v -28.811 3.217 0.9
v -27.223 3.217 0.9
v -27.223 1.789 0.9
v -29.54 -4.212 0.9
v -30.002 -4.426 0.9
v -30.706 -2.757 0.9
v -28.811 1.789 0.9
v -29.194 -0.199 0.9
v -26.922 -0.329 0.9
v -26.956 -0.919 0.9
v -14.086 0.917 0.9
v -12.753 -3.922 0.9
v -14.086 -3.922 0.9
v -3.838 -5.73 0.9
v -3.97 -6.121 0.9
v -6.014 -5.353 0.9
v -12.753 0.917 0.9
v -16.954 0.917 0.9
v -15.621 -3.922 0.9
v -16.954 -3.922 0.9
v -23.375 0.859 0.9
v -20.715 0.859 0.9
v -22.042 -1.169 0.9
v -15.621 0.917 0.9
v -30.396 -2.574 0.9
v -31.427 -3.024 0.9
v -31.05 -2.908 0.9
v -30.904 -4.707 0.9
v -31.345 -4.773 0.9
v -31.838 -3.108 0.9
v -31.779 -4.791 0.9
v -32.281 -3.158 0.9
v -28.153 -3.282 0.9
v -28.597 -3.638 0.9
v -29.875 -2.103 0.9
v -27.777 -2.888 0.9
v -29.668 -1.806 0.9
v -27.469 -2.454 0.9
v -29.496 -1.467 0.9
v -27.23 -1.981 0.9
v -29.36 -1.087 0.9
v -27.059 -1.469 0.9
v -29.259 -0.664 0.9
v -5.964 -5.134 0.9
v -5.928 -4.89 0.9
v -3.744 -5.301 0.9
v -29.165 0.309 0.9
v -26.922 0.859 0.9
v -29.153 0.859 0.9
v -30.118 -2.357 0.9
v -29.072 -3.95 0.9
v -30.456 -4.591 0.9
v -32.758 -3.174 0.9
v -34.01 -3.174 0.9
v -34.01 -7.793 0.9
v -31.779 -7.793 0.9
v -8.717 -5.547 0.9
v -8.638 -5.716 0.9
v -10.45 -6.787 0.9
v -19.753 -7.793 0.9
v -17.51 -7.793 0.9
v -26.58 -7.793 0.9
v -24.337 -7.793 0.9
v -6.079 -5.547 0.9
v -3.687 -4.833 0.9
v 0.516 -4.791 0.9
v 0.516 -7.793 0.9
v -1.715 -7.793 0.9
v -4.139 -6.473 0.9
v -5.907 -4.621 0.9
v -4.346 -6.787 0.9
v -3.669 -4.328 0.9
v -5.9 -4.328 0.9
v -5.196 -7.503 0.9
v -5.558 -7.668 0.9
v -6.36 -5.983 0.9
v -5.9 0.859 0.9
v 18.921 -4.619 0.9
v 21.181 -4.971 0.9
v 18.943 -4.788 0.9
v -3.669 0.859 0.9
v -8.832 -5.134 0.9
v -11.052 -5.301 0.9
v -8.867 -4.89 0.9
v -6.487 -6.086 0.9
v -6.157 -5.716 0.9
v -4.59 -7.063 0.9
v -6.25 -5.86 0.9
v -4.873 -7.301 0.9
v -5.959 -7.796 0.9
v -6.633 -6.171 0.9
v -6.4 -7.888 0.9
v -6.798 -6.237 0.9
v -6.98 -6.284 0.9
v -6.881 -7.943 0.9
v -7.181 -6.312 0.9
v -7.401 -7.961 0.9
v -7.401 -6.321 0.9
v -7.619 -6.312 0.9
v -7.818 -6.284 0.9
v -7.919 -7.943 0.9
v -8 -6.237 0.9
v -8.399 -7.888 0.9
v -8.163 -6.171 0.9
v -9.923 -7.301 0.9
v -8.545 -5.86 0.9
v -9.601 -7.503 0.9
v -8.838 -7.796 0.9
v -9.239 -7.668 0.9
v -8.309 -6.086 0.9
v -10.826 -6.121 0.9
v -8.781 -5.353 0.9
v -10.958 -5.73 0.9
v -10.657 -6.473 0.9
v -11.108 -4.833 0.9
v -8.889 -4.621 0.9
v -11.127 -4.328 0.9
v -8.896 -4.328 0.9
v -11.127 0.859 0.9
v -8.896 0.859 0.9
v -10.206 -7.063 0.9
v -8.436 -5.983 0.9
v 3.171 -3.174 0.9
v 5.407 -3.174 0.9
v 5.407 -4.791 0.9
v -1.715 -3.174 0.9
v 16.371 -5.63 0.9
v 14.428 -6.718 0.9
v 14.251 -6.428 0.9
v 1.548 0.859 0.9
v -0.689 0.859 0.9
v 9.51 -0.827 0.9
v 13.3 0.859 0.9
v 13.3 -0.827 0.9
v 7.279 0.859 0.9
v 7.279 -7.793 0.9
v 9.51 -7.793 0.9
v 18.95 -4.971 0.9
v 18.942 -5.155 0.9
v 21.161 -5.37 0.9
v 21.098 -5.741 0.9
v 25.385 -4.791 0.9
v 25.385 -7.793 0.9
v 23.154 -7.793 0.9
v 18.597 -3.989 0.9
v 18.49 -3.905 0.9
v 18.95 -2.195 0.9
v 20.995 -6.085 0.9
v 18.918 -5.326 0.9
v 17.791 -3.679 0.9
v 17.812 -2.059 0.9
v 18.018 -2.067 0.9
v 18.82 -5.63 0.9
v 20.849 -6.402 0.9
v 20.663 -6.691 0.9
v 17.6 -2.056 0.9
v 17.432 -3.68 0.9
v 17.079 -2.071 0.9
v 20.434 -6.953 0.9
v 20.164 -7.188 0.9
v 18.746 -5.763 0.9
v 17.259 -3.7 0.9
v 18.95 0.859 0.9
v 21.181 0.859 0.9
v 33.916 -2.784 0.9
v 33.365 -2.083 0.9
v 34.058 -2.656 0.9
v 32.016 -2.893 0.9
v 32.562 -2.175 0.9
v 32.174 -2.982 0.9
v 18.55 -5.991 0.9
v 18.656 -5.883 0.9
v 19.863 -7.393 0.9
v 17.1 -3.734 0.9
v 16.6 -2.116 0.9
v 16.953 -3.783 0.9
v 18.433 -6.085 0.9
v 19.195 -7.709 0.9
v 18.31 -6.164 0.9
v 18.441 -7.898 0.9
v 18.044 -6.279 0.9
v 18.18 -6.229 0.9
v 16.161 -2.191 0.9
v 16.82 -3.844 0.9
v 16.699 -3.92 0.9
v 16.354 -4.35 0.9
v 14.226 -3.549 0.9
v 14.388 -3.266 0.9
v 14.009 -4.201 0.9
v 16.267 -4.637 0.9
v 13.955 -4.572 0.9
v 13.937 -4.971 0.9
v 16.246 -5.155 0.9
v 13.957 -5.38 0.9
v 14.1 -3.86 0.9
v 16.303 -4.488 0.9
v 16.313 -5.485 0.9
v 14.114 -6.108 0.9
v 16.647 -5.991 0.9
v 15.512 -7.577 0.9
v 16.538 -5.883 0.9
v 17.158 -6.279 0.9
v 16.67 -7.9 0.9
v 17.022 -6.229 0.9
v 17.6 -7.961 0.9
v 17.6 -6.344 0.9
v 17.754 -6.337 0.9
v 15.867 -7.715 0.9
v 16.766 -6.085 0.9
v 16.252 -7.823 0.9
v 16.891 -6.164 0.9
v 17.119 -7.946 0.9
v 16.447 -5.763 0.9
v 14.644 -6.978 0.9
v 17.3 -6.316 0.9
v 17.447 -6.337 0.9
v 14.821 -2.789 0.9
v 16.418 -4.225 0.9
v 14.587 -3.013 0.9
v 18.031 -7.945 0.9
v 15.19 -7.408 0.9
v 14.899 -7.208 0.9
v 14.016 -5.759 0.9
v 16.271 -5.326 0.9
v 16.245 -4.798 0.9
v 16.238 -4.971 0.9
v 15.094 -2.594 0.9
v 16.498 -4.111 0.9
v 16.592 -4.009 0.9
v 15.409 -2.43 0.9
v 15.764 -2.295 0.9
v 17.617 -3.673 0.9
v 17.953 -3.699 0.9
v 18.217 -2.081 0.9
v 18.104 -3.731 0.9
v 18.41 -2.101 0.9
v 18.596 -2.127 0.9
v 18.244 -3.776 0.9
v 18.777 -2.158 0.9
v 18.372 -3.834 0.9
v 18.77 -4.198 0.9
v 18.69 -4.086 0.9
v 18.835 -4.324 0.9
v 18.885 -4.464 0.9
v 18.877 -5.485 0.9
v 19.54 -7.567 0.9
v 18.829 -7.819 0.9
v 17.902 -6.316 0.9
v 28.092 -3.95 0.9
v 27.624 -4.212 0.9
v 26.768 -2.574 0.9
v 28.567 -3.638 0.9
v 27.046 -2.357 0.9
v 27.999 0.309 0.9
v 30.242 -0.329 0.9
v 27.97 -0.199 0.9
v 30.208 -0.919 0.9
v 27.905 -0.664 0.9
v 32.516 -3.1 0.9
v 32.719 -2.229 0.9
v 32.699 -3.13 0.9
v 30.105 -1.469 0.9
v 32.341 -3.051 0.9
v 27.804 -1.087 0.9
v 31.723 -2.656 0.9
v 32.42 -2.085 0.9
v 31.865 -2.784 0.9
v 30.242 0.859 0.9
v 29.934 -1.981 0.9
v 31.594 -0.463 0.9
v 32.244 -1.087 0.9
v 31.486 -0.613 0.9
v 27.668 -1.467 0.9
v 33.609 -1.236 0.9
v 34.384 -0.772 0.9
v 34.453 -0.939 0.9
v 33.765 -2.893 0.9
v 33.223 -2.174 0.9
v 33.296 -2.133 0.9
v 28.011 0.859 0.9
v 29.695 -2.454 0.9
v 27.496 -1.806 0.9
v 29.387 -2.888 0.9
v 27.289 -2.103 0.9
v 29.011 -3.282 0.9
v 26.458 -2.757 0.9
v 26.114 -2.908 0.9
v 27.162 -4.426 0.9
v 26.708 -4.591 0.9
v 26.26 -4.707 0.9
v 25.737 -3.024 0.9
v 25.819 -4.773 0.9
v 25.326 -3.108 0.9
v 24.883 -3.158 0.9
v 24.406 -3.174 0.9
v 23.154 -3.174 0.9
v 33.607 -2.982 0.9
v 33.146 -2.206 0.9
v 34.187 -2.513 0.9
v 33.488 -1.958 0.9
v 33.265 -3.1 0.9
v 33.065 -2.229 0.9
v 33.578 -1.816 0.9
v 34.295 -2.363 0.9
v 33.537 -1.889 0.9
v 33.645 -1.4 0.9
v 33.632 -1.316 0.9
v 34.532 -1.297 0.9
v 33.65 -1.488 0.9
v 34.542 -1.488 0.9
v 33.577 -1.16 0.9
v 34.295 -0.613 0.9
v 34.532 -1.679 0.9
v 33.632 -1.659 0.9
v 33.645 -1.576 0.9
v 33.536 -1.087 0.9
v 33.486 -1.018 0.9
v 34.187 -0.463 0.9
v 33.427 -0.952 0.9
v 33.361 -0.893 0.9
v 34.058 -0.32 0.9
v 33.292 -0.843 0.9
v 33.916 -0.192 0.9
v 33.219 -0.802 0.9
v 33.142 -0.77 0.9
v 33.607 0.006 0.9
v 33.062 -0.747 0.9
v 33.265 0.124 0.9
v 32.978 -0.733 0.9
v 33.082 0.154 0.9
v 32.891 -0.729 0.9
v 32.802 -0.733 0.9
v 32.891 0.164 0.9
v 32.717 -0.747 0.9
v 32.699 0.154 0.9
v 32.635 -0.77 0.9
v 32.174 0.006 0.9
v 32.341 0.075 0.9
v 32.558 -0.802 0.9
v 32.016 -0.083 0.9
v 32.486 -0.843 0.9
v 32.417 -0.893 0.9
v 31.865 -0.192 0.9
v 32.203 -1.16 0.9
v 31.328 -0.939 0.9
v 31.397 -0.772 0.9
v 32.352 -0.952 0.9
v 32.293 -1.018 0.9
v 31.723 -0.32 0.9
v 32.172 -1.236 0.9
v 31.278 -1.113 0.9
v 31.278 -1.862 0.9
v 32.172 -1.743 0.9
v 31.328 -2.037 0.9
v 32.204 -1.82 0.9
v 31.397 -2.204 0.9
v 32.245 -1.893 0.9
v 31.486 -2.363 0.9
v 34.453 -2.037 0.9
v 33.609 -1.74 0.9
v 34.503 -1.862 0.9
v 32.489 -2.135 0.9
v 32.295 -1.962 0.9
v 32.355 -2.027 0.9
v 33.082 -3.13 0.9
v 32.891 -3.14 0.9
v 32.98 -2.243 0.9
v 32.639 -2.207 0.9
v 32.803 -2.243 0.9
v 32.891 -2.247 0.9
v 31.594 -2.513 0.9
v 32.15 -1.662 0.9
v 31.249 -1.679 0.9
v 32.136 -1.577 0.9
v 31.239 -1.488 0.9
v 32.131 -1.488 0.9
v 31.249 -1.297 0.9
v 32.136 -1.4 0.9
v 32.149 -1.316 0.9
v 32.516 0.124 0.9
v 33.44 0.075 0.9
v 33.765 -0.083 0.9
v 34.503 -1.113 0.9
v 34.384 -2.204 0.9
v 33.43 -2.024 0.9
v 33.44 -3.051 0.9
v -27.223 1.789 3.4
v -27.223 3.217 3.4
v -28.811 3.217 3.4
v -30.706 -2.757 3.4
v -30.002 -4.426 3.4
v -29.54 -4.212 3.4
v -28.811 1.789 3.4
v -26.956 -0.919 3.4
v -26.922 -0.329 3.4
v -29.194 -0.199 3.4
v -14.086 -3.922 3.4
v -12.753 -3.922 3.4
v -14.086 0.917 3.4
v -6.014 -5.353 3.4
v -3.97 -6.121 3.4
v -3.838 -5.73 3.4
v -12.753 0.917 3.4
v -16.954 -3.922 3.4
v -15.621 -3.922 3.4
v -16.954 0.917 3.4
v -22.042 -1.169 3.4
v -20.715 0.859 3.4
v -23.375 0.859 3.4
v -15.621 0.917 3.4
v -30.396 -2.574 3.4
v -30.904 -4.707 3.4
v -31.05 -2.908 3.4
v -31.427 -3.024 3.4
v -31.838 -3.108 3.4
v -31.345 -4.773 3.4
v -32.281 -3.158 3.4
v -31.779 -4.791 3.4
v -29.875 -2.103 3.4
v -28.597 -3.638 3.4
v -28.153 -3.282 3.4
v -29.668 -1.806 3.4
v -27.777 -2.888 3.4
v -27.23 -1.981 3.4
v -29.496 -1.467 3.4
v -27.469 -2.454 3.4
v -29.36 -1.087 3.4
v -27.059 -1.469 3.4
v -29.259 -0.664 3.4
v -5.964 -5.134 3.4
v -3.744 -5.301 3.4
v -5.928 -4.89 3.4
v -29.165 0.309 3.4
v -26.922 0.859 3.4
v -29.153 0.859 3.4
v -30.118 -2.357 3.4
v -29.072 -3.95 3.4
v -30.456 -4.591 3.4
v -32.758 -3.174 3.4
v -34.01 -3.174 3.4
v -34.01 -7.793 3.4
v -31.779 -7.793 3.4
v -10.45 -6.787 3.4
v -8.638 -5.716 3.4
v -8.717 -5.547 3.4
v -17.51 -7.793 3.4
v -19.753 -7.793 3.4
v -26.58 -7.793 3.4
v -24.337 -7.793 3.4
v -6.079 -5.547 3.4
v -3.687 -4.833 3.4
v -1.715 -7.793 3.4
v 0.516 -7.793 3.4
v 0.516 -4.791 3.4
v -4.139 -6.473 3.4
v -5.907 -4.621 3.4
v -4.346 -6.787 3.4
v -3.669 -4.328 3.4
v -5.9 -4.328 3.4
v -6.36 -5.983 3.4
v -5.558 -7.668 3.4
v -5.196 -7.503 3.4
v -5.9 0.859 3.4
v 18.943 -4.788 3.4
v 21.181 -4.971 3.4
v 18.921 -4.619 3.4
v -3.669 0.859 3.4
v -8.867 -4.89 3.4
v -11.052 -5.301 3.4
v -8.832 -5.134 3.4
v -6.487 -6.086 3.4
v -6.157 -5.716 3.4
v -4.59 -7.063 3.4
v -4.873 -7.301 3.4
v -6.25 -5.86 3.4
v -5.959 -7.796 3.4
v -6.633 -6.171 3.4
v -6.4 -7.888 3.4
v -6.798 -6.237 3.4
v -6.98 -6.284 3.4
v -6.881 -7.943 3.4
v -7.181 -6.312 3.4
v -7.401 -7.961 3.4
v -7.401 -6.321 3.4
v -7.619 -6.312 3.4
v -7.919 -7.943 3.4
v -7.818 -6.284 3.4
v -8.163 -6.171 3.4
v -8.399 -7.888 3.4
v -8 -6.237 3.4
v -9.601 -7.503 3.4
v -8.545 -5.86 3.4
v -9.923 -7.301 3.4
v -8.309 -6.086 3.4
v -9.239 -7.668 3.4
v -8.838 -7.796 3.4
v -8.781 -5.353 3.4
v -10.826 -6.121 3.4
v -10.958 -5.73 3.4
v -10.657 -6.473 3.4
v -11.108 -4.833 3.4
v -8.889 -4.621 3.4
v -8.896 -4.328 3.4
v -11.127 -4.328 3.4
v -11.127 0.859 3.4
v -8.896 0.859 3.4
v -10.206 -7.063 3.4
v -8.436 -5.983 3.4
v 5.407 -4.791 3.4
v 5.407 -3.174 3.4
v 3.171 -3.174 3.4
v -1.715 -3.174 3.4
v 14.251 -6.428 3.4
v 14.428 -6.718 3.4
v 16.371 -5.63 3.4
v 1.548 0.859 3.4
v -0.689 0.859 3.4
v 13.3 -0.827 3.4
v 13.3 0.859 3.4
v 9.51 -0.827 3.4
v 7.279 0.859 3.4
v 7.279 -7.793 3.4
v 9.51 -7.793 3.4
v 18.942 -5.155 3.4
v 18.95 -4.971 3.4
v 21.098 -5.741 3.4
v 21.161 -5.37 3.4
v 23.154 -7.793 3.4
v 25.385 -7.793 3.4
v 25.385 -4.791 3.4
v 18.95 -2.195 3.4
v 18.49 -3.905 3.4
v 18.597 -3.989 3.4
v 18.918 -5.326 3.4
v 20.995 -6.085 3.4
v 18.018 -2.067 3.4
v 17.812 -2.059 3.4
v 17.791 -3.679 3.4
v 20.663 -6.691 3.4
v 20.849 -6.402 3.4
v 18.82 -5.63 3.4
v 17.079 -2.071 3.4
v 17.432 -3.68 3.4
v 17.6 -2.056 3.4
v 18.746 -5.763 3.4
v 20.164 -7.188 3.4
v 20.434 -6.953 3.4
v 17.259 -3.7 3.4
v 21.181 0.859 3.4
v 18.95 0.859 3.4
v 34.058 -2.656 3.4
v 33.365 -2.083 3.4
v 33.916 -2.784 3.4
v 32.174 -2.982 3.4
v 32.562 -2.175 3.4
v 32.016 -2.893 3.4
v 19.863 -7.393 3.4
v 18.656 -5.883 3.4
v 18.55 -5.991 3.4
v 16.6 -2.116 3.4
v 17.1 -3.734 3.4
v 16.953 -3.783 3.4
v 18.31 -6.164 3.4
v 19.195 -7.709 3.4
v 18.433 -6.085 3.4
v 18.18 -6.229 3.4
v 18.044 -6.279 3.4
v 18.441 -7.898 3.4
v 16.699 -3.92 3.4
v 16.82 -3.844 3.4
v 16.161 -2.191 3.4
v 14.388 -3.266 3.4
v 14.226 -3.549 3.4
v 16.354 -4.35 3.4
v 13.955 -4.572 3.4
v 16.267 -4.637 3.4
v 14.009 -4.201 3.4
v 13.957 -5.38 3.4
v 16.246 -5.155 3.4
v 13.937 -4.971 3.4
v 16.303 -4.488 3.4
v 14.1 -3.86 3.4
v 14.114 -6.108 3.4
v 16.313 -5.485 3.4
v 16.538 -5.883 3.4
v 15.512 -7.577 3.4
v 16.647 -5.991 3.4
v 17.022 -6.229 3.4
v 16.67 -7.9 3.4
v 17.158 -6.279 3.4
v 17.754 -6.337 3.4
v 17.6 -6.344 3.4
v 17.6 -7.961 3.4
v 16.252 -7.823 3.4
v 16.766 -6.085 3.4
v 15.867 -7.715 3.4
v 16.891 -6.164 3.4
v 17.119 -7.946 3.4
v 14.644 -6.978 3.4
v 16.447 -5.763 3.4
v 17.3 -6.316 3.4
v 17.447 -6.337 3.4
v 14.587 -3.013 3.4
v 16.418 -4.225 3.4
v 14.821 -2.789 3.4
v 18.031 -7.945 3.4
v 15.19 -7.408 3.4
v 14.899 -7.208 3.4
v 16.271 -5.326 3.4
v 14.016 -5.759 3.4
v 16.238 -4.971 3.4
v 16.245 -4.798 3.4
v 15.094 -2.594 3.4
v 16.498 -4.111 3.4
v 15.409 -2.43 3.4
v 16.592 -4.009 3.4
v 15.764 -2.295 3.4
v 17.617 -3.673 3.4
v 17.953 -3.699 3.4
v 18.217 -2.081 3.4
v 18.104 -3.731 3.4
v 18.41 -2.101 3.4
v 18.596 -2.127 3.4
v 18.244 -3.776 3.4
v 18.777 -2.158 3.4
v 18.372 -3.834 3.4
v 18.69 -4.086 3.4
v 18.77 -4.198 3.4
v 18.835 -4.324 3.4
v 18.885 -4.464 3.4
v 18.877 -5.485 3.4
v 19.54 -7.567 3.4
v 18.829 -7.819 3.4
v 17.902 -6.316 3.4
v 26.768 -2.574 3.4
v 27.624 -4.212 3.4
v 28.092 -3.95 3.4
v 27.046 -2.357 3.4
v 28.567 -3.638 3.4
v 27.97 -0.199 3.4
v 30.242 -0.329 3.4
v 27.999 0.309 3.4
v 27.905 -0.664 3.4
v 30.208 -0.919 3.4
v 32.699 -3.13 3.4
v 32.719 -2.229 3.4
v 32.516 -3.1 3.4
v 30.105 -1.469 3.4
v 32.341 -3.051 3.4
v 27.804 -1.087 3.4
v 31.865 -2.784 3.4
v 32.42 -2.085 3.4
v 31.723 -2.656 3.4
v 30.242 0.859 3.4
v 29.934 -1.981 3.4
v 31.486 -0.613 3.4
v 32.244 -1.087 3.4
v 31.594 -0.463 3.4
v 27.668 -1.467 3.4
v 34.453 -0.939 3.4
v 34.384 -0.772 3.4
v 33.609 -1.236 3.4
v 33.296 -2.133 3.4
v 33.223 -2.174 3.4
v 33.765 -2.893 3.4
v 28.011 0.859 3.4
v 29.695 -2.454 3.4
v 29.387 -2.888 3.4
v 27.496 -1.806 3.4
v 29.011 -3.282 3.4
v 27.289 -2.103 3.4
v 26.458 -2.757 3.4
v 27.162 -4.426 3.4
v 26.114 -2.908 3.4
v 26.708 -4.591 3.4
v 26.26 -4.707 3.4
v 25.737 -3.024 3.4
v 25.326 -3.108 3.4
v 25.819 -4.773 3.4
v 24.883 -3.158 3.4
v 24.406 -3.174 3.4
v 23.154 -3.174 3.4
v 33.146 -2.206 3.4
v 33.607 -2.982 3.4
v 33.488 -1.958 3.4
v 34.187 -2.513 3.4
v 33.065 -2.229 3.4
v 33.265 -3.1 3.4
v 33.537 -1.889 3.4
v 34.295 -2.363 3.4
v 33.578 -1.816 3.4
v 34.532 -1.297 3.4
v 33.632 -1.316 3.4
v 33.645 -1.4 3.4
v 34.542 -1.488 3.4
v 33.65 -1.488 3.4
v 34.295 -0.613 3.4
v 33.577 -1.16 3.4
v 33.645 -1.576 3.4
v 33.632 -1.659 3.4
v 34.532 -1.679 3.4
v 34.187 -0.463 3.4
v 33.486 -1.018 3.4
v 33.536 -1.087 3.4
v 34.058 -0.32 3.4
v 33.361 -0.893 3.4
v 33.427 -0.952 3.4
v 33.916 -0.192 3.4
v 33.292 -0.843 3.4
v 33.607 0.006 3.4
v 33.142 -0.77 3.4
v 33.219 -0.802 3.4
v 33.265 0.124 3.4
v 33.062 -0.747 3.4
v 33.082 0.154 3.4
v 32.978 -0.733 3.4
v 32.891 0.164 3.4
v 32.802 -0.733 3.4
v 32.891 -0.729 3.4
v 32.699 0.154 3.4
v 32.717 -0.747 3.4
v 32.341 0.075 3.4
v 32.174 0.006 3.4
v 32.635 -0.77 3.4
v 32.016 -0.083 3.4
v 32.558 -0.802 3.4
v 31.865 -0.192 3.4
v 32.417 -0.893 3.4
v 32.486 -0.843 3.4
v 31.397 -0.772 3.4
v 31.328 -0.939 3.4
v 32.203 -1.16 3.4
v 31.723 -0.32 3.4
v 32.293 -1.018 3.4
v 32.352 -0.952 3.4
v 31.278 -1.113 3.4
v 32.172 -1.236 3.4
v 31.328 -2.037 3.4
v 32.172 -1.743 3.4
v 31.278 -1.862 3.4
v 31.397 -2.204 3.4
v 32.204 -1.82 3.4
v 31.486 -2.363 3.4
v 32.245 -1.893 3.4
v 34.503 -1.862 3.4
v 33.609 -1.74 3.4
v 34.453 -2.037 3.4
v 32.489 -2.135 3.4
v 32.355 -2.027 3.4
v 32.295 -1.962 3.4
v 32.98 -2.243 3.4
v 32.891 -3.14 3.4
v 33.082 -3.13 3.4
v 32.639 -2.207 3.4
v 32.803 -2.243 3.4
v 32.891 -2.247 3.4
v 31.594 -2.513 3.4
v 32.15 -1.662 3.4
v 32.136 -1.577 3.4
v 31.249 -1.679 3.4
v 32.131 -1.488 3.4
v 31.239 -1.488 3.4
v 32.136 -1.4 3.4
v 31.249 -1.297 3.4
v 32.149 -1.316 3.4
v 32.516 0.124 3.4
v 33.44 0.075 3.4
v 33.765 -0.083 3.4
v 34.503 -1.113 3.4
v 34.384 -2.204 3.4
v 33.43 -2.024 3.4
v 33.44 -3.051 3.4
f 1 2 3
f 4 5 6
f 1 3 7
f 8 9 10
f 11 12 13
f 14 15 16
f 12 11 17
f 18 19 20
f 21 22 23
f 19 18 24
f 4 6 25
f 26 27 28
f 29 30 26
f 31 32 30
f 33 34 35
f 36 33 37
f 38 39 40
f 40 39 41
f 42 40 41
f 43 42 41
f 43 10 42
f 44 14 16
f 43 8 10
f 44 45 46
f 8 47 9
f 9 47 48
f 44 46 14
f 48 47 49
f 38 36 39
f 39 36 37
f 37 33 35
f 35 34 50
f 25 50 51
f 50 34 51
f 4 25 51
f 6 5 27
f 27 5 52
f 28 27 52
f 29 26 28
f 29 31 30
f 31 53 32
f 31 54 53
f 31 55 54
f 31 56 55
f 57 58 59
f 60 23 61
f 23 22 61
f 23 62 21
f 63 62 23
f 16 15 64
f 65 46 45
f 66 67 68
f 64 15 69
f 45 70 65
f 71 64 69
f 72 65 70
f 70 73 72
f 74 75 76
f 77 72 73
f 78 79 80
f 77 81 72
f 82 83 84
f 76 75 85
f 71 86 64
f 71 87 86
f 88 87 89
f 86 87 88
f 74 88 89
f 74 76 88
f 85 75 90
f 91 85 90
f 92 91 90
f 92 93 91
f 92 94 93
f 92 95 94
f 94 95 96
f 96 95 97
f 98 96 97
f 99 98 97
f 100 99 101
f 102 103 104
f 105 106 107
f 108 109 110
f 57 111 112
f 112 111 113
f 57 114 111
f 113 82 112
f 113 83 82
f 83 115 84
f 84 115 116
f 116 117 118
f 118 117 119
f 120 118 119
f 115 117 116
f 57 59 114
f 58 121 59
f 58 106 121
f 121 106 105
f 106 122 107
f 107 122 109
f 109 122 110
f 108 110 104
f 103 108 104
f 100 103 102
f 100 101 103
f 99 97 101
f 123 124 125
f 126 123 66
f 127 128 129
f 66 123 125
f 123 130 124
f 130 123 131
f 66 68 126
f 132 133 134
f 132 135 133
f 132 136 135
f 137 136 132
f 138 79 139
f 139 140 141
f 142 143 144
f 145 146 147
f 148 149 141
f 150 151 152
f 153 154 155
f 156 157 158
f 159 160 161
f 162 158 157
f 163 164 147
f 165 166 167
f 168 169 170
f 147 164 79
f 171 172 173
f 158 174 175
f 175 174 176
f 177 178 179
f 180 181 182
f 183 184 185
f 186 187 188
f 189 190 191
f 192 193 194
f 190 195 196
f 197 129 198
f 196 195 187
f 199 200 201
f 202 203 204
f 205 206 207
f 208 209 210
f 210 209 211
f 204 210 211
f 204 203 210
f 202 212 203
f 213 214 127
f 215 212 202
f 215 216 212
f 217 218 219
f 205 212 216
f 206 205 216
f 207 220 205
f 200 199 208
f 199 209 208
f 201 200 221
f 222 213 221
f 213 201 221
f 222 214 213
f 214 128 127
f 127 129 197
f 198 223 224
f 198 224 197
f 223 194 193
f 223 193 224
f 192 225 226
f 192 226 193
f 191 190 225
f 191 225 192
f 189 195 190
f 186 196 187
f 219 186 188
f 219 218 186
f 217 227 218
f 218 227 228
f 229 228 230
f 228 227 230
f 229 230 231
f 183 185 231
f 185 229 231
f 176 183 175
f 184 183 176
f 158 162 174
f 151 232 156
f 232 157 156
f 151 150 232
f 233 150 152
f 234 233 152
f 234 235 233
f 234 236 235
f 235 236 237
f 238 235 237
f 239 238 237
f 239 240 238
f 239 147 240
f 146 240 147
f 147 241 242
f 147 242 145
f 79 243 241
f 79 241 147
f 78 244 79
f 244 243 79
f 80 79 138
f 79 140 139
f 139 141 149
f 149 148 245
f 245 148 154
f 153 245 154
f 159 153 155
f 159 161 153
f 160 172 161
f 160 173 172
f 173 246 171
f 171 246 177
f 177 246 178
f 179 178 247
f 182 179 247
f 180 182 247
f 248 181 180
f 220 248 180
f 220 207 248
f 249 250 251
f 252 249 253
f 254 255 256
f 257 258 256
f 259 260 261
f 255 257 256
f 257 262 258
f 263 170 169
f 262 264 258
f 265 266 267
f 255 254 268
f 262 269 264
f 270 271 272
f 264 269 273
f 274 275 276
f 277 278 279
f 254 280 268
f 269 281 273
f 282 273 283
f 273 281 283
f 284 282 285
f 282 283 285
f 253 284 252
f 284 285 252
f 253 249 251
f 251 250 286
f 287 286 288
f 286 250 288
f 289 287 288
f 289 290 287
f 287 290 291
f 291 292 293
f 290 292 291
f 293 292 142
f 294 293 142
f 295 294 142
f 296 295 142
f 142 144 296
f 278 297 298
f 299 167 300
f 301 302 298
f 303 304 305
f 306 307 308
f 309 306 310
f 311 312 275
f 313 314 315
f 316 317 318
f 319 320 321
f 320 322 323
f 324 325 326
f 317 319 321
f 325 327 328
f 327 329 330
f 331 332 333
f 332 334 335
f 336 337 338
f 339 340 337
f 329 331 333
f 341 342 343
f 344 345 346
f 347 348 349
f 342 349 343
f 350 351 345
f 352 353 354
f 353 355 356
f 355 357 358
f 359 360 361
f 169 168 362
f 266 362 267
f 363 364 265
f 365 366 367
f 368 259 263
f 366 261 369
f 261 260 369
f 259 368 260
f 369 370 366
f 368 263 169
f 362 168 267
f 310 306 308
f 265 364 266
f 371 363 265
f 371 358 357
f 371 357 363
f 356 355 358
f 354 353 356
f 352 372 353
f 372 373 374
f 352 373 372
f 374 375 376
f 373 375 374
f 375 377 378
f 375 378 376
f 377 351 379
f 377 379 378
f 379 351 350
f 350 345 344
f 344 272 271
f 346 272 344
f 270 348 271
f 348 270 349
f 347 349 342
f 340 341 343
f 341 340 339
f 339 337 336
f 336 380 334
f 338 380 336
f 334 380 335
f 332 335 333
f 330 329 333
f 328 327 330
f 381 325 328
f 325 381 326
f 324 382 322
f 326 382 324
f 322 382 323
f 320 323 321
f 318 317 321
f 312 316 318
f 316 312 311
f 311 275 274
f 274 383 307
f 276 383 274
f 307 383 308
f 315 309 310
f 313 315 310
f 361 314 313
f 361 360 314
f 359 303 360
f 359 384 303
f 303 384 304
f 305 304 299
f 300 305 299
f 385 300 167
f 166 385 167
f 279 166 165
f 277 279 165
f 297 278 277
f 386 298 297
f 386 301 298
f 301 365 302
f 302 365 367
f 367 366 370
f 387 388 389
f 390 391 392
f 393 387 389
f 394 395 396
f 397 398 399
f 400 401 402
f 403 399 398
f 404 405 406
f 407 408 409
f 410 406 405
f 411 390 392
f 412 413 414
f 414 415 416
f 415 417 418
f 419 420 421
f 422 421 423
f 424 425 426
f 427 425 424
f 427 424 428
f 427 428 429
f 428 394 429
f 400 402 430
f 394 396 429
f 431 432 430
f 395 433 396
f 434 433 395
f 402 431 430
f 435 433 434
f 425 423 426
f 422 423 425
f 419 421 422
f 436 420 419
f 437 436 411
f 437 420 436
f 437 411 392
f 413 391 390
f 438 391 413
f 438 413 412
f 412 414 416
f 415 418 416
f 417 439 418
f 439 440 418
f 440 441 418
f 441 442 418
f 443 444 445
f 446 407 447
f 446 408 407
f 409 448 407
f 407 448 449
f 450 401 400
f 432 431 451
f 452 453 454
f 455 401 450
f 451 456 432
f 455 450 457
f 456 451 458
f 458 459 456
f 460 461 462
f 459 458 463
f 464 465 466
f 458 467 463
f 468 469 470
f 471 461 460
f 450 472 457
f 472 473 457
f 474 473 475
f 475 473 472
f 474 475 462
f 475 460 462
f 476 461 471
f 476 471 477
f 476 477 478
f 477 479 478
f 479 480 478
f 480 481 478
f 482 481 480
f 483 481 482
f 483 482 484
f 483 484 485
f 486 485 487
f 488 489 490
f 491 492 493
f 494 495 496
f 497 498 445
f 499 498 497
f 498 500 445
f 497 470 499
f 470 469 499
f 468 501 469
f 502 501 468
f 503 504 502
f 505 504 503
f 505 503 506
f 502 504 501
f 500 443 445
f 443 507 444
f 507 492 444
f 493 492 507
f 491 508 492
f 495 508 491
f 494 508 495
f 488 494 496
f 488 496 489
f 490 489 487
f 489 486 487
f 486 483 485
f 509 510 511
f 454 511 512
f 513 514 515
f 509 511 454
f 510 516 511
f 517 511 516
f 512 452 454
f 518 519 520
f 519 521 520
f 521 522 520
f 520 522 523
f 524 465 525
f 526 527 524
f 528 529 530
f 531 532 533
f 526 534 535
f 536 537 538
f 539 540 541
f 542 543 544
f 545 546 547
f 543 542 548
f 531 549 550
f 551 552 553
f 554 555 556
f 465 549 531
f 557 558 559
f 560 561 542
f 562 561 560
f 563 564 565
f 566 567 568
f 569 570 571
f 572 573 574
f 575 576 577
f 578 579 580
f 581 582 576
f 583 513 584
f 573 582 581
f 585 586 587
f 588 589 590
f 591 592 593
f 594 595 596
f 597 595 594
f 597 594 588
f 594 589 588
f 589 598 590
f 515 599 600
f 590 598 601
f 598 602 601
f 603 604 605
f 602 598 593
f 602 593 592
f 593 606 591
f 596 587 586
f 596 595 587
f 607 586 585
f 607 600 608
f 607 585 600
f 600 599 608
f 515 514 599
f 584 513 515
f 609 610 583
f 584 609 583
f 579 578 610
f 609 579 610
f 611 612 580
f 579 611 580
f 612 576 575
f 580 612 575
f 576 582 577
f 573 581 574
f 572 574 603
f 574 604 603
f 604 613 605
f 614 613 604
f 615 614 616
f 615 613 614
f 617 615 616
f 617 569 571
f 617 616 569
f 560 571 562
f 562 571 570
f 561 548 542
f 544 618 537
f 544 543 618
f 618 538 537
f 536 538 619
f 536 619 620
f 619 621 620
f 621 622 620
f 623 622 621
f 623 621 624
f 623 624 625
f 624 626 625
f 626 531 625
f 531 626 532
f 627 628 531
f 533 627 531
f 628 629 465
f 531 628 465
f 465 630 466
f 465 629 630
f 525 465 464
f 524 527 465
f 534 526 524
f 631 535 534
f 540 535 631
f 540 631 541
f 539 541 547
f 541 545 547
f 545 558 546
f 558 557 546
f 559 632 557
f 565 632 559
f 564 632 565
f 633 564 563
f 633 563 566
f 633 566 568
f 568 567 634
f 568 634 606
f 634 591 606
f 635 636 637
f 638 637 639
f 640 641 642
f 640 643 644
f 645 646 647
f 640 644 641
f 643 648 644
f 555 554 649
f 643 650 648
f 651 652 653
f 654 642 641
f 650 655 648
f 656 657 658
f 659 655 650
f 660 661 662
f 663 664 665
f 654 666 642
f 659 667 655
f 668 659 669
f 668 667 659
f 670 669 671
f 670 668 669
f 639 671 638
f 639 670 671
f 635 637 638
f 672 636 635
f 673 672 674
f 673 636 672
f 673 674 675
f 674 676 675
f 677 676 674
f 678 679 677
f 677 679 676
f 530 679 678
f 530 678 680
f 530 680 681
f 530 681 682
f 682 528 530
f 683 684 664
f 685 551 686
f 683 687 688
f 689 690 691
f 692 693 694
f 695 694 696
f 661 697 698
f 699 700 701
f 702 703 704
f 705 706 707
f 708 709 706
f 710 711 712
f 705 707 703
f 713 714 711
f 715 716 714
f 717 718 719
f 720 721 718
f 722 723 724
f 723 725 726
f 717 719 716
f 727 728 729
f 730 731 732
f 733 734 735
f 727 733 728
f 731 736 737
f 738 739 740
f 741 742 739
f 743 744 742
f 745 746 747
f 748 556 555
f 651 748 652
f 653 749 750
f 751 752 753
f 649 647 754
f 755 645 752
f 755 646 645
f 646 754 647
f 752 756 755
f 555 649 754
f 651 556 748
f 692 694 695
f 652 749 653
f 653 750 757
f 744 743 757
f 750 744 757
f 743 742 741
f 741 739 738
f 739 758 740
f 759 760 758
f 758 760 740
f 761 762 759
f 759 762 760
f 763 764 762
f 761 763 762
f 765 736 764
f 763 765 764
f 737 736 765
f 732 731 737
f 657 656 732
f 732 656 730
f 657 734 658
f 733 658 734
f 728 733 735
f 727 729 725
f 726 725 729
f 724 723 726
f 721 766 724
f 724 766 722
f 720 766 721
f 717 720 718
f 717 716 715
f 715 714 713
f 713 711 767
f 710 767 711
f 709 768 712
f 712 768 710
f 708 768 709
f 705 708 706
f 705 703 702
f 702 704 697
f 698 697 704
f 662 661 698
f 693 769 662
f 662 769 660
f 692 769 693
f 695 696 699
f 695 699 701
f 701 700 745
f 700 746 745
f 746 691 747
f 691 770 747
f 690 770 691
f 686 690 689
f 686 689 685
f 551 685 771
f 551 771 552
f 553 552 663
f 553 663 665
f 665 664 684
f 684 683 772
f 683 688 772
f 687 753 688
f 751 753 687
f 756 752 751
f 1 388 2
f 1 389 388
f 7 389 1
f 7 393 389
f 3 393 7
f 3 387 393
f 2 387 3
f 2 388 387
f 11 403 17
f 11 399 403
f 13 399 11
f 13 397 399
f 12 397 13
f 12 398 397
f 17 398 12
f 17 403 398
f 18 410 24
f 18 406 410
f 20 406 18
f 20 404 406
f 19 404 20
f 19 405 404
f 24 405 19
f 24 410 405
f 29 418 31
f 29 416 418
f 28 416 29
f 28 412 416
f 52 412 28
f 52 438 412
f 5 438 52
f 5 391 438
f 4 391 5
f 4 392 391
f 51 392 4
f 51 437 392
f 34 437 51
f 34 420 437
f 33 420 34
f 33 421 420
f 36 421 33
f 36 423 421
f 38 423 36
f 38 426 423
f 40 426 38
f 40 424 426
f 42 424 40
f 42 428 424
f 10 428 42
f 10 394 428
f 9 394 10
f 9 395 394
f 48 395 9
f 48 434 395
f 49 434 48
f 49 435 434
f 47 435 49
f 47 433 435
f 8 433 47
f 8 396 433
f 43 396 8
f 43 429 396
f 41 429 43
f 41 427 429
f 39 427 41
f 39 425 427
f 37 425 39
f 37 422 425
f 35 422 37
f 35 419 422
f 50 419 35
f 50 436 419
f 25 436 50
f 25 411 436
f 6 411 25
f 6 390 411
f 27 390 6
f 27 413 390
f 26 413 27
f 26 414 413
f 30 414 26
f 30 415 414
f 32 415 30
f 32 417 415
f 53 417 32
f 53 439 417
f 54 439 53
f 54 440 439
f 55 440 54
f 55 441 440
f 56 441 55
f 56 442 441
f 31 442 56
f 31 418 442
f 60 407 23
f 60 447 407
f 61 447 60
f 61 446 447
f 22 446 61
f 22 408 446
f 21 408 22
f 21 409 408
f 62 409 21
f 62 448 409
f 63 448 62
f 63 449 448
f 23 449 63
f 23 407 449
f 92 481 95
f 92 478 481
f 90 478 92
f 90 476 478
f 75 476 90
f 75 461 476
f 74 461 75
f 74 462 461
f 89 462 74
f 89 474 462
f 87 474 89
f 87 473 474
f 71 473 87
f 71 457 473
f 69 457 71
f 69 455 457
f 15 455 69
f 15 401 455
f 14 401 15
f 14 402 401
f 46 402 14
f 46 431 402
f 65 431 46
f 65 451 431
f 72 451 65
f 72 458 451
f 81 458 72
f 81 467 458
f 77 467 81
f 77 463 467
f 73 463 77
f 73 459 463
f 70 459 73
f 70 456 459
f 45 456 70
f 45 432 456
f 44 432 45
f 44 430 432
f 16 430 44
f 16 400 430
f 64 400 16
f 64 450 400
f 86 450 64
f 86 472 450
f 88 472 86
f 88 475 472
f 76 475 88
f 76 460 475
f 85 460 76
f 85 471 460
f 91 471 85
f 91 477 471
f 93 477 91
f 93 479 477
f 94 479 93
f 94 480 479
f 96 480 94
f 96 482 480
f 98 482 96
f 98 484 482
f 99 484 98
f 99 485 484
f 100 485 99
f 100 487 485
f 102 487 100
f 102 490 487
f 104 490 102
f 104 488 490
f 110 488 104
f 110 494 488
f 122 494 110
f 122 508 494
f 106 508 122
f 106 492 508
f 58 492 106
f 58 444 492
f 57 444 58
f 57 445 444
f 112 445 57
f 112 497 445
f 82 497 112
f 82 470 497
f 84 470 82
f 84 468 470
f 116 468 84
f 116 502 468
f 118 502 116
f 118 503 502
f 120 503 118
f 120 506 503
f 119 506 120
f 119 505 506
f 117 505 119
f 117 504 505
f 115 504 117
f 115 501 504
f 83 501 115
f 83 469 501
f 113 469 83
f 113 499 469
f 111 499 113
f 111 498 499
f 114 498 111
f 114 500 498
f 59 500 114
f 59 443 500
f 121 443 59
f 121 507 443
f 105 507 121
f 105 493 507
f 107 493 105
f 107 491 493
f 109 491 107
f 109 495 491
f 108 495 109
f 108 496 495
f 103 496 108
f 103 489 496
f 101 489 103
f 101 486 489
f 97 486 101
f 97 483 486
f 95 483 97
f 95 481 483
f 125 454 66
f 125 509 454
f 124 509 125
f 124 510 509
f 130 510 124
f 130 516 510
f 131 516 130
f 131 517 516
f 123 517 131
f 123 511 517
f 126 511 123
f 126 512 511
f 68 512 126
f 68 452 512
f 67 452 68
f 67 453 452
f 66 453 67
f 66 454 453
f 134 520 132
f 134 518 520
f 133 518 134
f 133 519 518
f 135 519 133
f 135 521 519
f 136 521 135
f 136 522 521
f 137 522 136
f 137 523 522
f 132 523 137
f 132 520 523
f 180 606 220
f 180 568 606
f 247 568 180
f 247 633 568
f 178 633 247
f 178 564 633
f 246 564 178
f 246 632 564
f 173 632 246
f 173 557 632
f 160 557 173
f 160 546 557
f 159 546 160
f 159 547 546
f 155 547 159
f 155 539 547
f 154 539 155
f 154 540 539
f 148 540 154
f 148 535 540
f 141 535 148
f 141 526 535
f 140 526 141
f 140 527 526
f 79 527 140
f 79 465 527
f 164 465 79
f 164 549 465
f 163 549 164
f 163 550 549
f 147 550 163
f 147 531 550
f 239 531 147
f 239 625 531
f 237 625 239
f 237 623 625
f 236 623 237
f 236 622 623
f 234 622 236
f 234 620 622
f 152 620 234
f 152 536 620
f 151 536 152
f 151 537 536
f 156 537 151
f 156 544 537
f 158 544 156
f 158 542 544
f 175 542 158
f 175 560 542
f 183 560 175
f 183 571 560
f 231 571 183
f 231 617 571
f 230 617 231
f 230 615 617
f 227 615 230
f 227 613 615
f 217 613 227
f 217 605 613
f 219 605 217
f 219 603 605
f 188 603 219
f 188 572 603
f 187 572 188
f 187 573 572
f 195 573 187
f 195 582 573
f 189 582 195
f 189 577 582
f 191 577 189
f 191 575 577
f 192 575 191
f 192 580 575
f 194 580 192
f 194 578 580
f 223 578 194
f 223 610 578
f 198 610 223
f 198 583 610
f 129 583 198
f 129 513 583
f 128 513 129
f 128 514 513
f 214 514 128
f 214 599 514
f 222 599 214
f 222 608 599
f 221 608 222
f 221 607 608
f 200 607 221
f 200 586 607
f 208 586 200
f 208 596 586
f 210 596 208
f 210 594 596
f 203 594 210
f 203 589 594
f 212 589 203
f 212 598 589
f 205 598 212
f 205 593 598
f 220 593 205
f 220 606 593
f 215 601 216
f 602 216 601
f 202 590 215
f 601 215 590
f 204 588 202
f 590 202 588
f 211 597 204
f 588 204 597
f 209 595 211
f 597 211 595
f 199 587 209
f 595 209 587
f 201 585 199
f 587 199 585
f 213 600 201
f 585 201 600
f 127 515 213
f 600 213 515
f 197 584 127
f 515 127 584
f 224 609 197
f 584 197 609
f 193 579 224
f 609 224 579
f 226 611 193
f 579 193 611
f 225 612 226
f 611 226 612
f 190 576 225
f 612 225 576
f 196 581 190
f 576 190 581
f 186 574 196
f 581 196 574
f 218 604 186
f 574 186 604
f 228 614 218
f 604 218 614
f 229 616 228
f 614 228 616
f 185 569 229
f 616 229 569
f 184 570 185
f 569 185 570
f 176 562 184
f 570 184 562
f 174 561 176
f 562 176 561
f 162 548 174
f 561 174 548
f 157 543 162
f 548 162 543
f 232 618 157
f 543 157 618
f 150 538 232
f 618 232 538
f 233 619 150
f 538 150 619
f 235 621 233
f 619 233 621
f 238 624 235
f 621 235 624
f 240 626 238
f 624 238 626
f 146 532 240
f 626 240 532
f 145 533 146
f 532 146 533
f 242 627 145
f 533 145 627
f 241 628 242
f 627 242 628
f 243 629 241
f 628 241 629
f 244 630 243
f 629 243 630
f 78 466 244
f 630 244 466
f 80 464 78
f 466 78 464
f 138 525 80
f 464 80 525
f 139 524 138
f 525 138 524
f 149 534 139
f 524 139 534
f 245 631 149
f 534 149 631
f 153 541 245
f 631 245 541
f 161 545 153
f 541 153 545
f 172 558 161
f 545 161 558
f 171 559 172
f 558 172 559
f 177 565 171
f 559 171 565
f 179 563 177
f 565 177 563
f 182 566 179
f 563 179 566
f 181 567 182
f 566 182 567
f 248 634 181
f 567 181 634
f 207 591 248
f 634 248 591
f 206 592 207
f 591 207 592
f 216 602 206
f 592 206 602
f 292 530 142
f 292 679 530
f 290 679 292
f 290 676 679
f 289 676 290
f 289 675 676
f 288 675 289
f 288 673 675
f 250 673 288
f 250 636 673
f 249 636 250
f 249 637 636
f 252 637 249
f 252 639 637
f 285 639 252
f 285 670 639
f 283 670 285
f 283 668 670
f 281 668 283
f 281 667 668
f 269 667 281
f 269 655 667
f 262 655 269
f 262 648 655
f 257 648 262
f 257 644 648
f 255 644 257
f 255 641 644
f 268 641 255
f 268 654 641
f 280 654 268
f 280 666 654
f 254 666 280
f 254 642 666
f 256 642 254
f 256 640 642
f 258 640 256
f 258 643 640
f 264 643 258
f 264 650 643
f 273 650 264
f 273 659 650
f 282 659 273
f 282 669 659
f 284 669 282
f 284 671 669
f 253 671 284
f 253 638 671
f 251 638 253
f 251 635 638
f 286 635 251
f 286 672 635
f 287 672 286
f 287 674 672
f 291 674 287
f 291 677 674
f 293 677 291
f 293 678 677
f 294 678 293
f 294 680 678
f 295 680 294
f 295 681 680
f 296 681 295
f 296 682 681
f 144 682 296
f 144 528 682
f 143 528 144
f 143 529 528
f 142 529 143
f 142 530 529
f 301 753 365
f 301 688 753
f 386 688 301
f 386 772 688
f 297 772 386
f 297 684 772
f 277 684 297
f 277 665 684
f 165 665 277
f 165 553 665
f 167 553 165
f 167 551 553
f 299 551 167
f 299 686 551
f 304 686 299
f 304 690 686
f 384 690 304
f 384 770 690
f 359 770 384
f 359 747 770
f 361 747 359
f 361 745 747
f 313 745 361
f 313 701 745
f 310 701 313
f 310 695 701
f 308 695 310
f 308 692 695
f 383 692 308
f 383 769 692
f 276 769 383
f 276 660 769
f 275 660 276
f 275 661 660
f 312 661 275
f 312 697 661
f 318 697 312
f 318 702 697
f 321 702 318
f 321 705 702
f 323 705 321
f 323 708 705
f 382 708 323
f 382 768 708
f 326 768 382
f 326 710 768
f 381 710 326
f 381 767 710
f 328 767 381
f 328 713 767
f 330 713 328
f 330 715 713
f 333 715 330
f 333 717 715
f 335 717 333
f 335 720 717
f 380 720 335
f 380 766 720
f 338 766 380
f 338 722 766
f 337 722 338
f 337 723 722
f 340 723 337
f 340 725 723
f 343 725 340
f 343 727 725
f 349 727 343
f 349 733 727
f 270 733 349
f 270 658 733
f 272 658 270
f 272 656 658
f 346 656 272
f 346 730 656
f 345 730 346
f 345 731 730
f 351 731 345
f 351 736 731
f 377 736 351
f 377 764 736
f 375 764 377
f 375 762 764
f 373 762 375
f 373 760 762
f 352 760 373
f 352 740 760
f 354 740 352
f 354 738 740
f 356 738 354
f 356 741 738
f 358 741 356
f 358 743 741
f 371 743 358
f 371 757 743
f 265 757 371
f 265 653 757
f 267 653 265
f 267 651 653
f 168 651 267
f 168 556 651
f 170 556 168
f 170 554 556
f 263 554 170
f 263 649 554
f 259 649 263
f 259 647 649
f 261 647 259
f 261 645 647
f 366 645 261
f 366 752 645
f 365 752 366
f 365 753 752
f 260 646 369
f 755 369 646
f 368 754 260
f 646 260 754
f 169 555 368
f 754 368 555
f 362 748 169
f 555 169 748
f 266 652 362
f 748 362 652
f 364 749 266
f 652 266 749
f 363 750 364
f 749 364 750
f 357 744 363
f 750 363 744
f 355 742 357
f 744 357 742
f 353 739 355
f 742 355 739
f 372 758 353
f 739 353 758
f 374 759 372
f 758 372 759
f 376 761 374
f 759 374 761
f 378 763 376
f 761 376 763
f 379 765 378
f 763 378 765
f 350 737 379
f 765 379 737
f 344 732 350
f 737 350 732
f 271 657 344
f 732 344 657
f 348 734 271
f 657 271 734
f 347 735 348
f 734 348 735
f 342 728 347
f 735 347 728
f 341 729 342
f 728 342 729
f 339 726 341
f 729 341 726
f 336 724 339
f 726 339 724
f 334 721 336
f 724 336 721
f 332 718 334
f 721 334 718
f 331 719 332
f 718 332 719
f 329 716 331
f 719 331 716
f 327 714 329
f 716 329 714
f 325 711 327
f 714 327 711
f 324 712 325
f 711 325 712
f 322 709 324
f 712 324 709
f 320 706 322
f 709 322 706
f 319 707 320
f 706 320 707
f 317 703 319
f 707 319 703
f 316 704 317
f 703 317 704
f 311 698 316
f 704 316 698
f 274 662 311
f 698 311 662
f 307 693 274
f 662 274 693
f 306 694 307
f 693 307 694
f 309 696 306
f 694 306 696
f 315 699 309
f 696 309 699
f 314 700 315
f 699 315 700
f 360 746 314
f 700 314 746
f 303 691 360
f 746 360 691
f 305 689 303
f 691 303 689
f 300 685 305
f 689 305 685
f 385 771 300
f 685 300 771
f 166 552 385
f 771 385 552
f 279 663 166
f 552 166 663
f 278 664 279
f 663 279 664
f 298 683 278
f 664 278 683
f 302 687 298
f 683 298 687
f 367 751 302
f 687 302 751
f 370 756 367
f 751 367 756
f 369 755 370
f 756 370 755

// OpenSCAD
$fn = 48;
  // syllabics (overlaid on icon, tallest)
  translate([0, -2.500, 0.900]) linear_extrude(height=2.500) text("ᓰᐱᐦᑌᔨᒥᑯᓯᐤ", size=8.546, halign="center", valign="center", font="Euphemia UCAS:style=Bold");
